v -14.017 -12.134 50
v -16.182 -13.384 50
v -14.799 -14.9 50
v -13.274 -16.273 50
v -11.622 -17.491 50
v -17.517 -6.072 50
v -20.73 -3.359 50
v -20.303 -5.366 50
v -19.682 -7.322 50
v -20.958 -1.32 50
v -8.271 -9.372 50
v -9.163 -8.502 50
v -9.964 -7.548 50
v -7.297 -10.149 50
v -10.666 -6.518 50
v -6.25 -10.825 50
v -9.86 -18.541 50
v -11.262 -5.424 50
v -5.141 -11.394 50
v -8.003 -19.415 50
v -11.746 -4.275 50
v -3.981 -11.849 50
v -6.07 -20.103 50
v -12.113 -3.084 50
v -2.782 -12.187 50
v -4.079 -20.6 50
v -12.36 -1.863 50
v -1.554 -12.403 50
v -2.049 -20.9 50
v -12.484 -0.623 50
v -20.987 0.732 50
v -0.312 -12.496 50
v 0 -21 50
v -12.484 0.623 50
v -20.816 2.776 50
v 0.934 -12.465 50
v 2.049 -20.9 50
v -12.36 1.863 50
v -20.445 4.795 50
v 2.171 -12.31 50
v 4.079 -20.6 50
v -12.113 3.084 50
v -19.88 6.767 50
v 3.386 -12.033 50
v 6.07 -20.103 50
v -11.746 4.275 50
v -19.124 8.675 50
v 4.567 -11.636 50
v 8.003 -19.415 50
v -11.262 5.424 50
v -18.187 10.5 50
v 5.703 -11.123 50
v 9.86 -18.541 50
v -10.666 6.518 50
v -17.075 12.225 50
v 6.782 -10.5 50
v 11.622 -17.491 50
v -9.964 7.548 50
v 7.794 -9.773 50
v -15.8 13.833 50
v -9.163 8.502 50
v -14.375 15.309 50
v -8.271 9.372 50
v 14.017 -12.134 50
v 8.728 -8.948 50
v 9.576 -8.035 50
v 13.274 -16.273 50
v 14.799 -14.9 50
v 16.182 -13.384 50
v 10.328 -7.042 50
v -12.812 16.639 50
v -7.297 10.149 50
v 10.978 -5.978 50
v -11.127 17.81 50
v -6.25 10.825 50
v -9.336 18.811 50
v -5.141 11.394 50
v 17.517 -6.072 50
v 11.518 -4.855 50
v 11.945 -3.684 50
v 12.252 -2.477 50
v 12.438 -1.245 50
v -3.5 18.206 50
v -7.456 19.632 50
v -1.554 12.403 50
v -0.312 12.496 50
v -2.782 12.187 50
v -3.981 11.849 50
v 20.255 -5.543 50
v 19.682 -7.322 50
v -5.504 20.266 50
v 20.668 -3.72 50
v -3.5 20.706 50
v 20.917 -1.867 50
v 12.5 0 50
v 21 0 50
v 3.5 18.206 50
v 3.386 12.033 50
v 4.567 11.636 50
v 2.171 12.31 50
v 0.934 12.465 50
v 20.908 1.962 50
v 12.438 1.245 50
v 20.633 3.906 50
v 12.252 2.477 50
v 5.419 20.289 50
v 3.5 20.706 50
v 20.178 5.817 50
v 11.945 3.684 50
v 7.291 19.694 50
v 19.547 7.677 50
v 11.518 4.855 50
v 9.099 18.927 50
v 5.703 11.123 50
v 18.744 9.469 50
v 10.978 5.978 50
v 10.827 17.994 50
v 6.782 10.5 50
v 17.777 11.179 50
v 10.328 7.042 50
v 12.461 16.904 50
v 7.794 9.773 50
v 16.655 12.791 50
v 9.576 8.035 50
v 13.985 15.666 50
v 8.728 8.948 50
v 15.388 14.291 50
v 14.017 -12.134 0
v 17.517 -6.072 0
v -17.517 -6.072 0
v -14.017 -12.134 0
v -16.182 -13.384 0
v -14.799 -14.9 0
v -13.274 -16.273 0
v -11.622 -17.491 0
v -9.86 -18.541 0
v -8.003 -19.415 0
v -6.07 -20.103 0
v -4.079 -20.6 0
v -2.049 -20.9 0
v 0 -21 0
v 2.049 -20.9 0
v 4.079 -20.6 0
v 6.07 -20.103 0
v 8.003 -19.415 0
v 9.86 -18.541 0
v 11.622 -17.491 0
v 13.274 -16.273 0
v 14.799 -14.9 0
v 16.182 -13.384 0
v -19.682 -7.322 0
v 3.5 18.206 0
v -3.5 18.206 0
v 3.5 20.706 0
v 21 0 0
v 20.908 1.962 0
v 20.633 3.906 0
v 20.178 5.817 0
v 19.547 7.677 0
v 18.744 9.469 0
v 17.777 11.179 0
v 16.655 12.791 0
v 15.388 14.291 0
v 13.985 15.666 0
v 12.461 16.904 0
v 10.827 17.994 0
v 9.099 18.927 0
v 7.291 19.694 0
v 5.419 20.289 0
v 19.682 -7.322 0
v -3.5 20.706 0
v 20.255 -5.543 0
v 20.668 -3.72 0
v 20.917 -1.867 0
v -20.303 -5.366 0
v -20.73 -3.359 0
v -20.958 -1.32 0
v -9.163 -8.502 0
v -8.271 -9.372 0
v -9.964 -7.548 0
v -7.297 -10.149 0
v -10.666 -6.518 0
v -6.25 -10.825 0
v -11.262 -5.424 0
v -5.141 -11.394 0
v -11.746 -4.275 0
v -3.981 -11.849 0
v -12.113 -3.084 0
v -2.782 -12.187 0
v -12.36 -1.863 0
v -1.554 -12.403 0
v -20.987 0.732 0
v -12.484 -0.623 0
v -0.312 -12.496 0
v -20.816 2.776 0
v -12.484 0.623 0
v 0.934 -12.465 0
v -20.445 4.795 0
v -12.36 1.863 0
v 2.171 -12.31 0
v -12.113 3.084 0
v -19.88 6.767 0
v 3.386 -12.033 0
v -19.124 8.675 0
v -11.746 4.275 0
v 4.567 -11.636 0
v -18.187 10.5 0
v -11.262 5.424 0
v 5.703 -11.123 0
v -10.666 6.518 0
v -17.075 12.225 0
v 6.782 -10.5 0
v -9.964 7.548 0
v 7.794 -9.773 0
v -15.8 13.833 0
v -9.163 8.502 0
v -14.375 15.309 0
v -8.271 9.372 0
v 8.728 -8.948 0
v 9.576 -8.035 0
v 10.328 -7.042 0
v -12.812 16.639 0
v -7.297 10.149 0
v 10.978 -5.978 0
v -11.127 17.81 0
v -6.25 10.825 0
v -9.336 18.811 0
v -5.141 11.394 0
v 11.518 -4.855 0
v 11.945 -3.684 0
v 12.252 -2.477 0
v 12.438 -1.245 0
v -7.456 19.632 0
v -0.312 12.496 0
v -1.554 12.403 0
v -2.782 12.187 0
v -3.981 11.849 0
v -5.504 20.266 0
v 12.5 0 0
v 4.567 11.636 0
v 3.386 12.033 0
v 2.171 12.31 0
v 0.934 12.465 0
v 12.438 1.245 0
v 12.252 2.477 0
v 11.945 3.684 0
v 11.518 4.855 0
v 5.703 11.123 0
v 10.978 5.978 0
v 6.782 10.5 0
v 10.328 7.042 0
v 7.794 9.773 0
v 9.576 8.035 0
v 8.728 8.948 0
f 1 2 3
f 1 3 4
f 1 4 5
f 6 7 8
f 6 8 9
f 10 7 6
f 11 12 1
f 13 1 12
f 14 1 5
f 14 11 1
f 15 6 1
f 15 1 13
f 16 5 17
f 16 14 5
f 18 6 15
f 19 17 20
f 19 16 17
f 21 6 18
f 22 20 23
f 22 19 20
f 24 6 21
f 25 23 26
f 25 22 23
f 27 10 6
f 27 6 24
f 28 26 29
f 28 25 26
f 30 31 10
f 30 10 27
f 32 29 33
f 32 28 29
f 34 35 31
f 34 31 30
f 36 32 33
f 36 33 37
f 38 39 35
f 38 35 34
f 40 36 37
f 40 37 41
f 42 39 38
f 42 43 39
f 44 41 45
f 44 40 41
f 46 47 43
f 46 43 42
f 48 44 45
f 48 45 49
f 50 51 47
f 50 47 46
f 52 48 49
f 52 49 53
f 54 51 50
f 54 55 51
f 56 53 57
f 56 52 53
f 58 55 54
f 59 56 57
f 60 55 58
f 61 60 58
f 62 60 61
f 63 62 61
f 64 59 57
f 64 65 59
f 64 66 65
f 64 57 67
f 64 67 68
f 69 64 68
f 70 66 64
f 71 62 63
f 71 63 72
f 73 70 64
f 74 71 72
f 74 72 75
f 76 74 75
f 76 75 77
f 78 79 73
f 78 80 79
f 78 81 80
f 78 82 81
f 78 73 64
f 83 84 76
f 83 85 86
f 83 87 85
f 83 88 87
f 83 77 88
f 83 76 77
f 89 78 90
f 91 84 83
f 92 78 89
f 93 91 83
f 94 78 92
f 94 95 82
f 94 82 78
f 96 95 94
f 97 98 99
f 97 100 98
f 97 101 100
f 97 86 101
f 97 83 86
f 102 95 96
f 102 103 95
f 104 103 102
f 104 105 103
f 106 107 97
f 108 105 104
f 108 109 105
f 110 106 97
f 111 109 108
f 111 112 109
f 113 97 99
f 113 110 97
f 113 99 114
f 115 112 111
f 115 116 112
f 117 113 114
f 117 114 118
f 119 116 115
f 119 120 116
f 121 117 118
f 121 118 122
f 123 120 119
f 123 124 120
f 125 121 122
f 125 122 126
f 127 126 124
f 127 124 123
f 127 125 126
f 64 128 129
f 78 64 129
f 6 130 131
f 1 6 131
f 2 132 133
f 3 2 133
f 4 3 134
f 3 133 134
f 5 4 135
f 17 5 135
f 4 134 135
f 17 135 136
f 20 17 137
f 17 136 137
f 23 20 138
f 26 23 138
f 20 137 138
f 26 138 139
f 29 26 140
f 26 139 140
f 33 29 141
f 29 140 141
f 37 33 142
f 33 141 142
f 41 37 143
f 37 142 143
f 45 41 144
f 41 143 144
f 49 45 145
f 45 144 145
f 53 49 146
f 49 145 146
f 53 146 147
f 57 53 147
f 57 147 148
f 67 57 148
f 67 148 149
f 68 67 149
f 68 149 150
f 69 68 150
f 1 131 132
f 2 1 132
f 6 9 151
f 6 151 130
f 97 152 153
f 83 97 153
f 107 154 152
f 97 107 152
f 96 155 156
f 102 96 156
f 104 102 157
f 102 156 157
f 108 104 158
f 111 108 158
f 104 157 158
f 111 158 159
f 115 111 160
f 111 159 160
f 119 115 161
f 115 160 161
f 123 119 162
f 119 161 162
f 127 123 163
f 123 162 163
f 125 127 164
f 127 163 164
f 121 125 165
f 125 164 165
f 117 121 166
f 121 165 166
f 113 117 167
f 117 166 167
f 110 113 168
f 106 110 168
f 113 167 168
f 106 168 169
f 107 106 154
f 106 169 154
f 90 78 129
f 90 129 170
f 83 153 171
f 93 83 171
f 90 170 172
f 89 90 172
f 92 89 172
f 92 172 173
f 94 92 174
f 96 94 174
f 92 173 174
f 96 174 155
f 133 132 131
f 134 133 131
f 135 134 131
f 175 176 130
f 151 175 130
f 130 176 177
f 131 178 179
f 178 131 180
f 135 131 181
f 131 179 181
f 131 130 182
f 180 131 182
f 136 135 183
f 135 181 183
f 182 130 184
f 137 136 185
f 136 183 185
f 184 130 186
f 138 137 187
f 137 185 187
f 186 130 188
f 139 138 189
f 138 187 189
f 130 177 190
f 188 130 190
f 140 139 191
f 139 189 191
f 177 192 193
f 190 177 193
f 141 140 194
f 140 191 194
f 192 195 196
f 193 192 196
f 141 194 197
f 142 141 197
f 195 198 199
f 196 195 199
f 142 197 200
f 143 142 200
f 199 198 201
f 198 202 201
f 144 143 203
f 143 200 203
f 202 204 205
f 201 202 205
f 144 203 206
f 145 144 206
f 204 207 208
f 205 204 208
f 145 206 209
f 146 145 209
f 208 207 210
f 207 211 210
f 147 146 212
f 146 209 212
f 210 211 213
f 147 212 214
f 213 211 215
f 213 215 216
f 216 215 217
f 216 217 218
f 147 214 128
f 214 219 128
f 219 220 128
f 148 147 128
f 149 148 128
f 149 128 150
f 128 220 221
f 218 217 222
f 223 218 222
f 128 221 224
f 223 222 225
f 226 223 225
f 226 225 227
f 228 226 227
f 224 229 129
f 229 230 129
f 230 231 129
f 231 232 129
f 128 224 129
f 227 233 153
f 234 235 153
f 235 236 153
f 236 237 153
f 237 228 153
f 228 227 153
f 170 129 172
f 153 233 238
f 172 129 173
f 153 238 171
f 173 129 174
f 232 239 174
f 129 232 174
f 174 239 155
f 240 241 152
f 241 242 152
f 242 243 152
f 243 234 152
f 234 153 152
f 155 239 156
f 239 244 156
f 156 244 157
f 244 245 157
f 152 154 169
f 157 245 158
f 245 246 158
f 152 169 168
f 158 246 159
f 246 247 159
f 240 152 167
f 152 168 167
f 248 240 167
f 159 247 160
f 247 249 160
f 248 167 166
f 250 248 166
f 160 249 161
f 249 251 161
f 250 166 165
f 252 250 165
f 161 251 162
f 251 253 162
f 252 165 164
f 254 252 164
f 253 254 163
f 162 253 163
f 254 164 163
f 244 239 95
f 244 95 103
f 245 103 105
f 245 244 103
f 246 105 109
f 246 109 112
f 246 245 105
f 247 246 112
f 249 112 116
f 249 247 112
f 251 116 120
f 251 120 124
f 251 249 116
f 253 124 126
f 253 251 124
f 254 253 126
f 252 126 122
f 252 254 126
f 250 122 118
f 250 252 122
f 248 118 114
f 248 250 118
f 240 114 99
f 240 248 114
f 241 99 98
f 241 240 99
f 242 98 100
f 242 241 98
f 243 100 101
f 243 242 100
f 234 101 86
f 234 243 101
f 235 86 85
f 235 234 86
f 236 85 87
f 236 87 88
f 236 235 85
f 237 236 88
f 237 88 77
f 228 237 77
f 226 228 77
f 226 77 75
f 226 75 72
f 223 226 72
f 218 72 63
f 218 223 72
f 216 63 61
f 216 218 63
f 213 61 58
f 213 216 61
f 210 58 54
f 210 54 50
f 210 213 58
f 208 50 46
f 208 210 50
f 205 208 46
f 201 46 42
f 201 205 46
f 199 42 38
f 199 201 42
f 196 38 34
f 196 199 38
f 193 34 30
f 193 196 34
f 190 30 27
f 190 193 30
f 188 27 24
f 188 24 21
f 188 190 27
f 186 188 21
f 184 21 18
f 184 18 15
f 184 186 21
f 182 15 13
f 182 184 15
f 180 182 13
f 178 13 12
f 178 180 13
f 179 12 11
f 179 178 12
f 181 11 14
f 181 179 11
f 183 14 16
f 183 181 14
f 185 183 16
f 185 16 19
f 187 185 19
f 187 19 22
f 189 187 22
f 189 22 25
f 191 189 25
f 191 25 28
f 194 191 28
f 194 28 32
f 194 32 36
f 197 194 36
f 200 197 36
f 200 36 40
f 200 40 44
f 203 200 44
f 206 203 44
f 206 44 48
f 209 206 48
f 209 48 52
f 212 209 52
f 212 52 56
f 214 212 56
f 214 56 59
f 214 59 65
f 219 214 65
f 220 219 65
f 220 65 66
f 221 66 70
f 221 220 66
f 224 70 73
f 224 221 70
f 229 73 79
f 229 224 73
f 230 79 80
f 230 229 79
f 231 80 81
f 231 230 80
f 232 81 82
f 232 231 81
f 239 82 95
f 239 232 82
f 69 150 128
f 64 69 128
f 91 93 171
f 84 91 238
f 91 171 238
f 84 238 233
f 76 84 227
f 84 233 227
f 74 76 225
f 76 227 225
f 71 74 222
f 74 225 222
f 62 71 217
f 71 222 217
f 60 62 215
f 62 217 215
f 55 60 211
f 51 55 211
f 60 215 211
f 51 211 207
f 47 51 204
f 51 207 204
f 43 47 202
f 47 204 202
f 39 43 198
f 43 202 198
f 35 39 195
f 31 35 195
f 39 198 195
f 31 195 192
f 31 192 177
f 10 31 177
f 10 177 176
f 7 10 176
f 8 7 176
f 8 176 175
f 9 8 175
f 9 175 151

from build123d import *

# Parameters (mm, degrees)
SKETCH_1_R      = 12.5
EXTRUDE_1_DEPTH = 50


with BuildPart() as part:
    # Эскиз1 → Бобышка-Вытянуть1 (new body)
    with BuildSketch(Plane.XY):
        with BuildLine():
            Line((-3.5, 18.206279241), (-3.5, 20.706279241))
            ThreePointArc((-3.5, 20.706279241), (-18.186533479, 10.5), (-19.68216384, -7.322050707))
            Line((-19.68216384, -7.322050707), (-17.517100331, -6.072050707))
            Line((-17.517100331, -6.072050707), (-14.017100331, -12.134228534))
            Line((-14.017100331, -12.134228534), (-16.18216384, -13.384228534))
            ThreePointArc((-16.18216384, -13.384228534), (0, -21), (16.18216384, -13.384228534))
            Line((16.18216384, -13.384228534), (14.017100331, -12.134228534))
            Line((14.017100331, -12.134228534), (17.517100331, -6.072050707))
            Line((17.517100331, -6.072050707), (19.68216384, -7.322050707))
            ThreePointArc((19.68216384, -7.322050707), (20.667915239, -3.719849416), (21, 0))
            ThreePointArc((21, 0), (16.039014932, 13.555441712), (3.5, 20.706279241))
            Line((3.5, 20.706279241), (3.5, 18.206279241))
            Line((3.5, 18.206279241), (-3.5, 18.206279241))
        make_face()
        Circle(SKETCH_1_R, mode=Mode.SUBTRACT)
    extrude(amount=EXTRUDE_1_DEPTH)


solid = part.part
